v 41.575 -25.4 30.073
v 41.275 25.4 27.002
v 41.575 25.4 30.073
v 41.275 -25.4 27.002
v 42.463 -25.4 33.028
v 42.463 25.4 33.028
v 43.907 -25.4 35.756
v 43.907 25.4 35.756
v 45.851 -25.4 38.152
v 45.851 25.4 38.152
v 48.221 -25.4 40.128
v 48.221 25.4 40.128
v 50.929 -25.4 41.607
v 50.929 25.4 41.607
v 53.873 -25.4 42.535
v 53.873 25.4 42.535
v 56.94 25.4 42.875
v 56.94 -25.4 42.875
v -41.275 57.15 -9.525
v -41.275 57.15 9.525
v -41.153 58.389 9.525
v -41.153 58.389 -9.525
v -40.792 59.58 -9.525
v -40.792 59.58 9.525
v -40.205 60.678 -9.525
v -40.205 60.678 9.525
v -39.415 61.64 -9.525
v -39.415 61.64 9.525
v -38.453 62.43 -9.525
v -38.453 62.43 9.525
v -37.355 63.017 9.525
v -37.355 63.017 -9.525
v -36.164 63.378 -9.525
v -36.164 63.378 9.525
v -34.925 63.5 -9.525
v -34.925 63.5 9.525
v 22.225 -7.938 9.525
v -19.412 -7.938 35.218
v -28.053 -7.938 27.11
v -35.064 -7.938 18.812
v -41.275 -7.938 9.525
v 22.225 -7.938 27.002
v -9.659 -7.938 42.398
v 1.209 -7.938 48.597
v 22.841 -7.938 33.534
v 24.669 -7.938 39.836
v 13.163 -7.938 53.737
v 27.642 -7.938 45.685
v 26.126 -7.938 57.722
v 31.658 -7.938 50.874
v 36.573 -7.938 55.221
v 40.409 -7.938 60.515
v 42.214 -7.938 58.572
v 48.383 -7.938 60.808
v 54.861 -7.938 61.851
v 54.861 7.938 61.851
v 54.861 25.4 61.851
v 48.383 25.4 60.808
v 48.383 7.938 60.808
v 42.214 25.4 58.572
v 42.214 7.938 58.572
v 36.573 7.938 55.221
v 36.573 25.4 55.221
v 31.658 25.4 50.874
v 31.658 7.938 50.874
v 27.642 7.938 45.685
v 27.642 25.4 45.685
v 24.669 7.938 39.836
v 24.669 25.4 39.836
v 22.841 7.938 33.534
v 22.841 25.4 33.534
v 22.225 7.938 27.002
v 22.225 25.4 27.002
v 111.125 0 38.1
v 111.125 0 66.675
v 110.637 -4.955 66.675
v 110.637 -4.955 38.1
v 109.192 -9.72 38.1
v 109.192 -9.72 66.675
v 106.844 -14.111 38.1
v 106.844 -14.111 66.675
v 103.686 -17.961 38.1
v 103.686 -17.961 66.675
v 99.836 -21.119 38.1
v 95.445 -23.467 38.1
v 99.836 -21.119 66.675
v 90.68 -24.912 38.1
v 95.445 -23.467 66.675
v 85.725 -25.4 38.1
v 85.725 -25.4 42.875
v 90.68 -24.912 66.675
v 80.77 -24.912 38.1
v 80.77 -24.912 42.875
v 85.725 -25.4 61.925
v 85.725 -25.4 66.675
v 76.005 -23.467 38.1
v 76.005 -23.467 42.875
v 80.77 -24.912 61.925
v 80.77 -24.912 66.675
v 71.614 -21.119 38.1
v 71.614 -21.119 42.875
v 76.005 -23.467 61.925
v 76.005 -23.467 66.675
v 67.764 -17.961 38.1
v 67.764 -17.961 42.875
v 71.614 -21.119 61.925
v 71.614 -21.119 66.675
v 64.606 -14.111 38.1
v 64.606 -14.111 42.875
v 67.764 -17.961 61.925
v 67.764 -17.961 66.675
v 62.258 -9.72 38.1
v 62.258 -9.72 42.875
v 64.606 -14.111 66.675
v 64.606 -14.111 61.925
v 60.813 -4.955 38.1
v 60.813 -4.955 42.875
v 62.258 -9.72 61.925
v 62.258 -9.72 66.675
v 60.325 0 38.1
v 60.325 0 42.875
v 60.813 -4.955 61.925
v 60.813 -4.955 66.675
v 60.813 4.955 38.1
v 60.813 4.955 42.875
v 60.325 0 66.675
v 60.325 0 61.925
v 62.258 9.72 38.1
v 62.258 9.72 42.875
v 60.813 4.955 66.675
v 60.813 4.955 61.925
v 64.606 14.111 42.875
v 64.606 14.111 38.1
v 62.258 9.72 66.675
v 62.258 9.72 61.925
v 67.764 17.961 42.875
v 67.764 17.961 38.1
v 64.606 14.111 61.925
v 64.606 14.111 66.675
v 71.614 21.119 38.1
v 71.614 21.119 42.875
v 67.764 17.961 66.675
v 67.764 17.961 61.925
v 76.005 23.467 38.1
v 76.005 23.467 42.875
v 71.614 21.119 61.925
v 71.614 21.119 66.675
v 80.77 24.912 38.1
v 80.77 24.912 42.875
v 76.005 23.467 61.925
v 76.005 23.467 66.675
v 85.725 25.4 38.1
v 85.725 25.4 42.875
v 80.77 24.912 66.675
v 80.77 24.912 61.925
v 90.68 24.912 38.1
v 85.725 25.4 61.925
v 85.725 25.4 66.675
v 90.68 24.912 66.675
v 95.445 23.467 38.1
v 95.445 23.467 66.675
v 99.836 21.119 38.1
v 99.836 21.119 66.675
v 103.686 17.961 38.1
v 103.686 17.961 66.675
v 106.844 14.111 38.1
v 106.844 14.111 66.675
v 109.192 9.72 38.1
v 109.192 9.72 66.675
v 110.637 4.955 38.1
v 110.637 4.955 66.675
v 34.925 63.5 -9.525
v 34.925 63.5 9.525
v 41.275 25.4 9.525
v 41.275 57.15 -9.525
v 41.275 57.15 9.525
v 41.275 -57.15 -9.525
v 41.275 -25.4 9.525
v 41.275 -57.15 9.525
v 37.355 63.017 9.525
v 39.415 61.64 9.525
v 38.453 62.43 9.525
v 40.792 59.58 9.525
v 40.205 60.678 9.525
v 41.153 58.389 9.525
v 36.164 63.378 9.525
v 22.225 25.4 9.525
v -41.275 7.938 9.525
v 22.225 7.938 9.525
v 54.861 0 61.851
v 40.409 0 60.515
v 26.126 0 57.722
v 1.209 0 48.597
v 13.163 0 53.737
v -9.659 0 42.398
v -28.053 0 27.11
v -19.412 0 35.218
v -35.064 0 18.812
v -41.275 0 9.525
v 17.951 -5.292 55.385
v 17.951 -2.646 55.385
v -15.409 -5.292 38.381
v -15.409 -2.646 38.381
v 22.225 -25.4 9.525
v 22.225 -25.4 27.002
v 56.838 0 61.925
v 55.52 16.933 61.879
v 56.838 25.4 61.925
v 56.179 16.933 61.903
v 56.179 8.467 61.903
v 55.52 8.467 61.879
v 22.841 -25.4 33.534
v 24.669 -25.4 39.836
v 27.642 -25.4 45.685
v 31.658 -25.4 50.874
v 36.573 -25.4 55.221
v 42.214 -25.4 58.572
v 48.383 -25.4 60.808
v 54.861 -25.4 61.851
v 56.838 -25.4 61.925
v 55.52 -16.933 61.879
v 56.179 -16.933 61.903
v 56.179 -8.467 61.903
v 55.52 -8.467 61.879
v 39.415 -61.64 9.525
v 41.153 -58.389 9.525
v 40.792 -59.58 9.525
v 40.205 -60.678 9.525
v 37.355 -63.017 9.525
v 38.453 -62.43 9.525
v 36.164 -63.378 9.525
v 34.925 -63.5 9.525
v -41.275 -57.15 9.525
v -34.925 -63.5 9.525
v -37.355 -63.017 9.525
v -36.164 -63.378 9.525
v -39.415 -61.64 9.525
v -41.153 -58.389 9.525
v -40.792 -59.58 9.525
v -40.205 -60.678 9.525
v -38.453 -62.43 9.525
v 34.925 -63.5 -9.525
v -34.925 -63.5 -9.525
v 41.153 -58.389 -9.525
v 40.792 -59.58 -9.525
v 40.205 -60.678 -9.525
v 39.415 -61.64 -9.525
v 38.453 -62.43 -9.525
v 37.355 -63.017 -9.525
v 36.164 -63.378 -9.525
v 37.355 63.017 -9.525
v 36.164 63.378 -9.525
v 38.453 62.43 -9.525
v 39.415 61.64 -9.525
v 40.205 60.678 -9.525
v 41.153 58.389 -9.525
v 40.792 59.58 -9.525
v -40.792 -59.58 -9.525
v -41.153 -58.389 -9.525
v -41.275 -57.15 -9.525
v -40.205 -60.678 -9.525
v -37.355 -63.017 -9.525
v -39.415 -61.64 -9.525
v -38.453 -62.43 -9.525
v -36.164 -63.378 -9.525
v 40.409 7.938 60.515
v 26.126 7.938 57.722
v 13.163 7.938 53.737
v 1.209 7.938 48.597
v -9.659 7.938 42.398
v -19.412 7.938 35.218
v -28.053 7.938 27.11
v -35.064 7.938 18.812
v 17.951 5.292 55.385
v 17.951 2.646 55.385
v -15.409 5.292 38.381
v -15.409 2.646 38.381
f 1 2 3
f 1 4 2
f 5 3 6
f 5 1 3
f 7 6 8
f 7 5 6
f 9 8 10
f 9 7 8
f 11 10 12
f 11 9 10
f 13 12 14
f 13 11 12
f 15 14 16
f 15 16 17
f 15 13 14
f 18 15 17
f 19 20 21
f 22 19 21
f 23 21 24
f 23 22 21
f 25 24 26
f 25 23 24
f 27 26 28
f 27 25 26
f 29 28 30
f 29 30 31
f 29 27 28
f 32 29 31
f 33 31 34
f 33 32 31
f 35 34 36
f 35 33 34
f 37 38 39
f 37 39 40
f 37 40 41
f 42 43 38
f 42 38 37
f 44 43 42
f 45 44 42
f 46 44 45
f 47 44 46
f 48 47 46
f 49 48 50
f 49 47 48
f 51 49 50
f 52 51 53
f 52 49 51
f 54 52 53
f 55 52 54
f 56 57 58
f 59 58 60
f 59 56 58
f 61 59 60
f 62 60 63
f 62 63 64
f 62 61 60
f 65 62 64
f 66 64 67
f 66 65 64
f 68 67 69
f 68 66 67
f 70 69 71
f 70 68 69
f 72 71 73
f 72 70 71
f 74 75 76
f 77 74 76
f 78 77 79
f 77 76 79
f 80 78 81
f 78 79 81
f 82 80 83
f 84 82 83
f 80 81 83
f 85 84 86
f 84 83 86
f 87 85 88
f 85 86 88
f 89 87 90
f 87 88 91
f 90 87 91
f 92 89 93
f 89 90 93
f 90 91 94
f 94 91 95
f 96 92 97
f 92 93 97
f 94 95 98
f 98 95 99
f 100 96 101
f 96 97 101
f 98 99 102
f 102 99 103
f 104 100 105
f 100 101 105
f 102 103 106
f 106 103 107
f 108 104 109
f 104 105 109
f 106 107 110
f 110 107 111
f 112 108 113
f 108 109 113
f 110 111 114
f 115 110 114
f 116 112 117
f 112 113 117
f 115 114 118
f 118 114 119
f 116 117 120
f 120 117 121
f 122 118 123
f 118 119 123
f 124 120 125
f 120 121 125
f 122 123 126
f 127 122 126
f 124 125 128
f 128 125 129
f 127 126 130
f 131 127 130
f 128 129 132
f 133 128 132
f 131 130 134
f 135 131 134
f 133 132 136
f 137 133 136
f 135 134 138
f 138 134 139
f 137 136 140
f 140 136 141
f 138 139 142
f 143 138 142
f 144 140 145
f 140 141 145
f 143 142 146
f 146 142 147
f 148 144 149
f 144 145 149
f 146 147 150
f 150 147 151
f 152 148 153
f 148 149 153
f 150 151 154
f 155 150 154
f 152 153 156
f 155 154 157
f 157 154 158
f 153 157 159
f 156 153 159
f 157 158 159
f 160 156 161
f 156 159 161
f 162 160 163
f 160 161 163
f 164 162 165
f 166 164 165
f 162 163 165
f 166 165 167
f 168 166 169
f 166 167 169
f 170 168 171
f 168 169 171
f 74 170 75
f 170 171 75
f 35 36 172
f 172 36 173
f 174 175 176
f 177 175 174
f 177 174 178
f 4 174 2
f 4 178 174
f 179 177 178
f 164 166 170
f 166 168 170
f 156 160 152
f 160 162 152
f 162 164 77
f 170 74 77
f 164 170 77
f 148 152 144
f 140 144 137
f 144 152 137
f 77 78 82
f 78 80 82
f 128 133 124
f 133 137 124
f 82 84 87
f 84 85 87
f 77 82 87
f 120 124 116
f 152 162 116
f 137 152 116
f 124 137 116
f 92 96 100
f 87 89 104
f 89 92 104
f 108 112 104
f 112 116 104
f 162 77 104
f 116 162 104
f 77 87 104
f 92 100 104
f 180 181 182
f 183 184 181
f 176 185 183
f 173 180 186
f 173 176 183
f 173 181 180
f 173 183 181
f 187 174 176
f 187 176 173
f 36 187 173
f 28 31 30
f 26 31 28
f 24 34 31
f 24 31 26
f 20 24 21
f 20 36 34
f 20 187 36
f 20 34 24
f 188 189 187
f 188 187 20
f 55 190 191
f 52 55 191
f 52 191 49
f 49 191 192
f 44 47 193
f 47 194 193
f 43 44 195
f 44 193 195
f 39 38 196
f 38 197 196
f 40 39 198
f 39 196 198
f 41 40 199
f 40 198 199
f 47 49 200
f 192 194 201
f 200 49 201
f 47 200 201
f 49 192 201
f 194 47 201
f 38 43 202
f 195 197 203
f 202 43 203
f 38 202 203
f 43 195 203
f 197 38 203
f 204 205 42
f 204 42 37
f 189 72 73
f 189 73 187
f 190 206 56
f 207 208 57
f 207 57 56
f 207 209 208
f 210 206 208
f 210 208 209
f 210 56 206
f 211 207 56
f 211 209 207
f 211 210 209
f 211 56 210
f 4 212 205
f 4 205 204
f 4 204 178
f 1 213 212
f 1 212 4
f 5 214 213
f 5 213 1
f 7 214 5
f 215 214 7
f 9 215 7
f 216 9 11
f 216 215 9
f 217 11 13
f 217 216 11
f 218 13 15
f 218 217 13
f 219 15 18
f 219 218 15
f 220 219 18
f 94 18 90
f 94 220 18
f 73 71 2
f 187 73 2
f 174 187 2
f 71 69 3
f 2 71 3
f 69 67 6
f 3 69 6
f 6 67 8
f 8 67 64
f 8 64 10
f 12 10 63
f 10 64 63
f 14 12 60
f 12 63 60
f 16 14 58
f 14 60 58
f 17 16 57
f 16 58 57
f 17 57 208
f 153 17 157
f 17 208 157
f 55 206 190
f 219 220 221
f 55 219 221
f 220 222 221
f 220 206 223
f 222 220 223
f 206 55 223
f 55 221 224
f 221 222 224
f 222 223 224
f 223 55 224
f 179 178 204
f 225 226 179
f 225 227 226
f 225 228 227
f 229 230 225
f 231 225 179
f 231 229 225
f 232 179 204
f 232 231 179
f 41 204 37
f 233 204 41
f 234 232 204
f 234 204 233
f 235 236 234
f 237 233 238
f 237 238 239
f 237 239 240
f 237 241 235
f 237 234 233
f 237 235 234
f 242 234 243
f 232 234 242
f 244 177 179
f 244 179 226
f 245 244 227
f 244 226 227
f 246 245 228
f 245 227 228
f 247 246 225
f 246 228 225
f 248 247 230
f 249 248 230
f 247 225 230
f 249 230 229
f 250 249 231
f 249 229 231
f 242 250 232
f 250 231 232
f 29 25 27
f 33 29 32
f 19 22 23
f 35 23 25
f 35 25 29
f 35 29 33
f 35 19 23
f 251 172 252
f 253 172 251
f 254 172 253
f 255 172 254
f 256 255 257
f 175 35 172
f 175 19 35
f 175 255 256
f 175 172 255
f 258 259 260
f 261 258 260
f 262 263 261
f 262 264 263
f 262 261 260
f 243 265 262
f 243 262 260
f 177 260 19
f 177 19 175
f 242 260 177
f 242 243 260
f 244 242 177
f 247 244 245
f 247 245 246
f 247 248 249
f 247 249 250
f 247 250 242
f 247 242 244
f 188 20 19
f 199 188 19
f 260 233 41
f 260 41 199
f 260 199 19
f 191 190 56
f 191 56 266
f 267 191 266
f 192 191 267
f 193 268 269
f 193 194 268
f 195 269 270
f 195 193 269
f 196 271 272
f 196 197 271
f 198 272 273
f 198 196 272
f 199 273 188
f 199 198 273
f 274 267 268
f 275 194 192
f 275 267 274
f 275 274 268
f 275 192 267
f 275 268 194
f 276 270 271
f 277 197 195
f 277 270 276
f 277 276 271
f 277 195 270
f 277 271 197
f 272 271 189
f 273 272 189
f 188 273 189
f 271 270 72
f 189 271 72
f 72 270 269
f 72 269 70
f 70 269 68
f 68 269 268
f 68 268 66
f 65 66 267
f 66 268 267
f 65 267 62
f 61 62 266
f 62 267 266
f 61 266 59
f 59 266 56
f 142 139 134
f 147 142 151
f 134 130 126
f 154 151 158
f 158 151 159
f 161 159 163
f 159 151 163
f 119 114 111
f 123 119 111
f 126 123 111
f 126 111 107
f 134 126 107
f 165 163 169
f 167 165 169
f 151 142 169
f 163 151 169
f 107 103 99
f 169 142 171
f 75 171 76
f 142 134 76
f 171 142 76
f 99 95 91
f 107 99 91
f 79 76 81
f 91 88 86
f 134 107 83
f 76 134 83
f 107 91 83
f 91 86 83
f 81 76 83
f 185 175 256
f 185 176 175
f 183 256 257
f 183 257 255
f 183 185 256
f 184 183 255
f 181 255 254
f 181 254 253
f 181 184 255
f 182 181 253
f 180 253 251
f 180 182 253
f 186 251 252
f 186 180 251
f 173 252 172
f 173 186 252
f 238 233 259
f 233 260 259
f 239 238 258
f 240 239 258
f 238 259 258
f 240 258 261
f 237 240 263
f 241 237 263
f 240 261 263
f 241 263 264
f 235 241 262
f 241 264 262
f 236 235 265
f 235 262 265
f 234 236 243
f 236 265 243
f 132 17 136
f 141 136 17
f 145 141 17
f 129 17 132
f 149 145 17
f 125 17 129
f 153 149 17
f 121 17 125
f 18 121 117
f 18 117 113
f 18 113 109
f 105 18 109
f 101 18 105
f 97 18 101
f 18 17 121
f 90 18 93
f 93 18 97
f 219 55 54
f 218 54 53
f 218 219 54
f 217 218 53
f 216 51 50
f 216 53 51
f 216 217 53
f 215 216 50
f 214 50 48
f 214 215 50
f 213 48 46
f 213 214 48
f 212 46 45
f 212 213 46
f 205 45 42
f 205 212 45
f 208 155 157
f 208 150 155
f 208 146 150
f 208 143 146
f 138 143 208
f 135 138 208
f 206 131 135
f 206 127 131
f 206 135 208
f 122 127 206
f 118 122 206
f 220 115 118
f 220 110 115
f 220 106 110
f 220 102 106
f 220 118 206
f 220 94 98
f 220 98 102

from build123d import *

# Parameters (mm, degrees)
F1_DEPTH = 63.5
F0_W     = 25.4
F0_H     = 19.05
F2_DEPTH = 25.4
F3_DEPTH = 7.9375
F5_R     = 6.35


with BuildPart() as f1:
    # F0 (on Front) → F1 (new body, symmetric)
    with BuildSketch(Plane.XZ):
        Polygon((22.225, 9.525), (-41.275, 9.525), (-41.275, -9.525), (41.275, -9.525), (41.275, 9.525), align=None)
    extrude(amount=F1_DEPTH, both=True)

    # F0 (on Front) → F2 (join, symmetric)
    with BuildSketch(Plane.XZ):
        with Locations((73.025, 52.4002)):
            Rectangle(F0_W, F0_H)
        with BuildLine():
            Line((22.225, 27.0015947561), (22.225, 9.525))
            Line((22.225, 9.525), (41.275, 9.525))
            Line((41.275, 9.525), (41.275, 27.0015947561))
            ThreePointArc((41.275, 27.0015947561), (45.8505258857, 38.1522678183), (56.9395681561, 42.8752))
            Line((56.9395681561, 42.8752), (60.325, 42.8752))
            Line((60.325, 42.8752), (60.325, 61.9252))
            Line((60.325, 61.9252), (56.837875396, 61.9252))
            add(Edge.make_bspline(
                [(56.837875396, 61.9252), (56.1791036385, 61.904913743), (55.5200497896, 61.880354768), (54.8608113135, 61.8514905975)],
                knots=[0, 0, 0, 0, 1.9281744769, 1.9281744769, 1.9281744769, 1.9281744769], degree=3))
            ThreePointArc((54.8608113135, 61.8514905975), (31.6577900146, 50.8742329652), (22.225, 27.0015947561))
        make_face()
    extrude(amount=F2_DEPTH, both=True)

    # F0 (on Front) → F3 (join, symmetric)
    with BuildSketch(Plane.XZ):
        with BuildLine():
            add(Edge.make_bspline(
                [(54.8608113135, 61.8514905975), (17.4910659658, 60.2152895251), (-20.4719474509, 44.745078984), (-41.275, 9.525)],
                knots=[1.9281744769, 1.9281744769, 1.9281744769, 1.9281744769, 111.2291206407, 111.2291206407, 111.2291206407, 111.2291206407], degree=3))
            Line((-41.275, 9.525), (22.225, 9.525))
            Line((22.225, 9.525), (22.225, 27.0015947561))
            ThreePointArc((22.225, 27.0015947561), (31.6577900146, 50.8742329652), (54.8608113135, 61.8514905975))
        make_face()
    extrude(amount=F3_DEPTH, both=True)

    # F0 (on Front) → F4 (revolve)
    with BuildSketch(Plane.XZ):
        Polygon((85.725, 66.675), (85.725, 61.9252), (85.725, 42.8752), (85.725, 38.1), (111.125, 38.1), (111.125, 66.675), align=None)
    revolve(axis=Axis((85.725, 0, 51.1358389631), (0, 0, -1)))

    # F5
    f5_edges = [f1.edges().sort_by_distance(p)[0] for p in [
        (41.275, -63.5, 0),
        (-41.275, -63.5, 0),
        (-41.275, 63.5, 0),
        (41.275, 63.5, 0),
    ]]
    fillet(f5_edges, radius=F5_R)


solid = f1.part
